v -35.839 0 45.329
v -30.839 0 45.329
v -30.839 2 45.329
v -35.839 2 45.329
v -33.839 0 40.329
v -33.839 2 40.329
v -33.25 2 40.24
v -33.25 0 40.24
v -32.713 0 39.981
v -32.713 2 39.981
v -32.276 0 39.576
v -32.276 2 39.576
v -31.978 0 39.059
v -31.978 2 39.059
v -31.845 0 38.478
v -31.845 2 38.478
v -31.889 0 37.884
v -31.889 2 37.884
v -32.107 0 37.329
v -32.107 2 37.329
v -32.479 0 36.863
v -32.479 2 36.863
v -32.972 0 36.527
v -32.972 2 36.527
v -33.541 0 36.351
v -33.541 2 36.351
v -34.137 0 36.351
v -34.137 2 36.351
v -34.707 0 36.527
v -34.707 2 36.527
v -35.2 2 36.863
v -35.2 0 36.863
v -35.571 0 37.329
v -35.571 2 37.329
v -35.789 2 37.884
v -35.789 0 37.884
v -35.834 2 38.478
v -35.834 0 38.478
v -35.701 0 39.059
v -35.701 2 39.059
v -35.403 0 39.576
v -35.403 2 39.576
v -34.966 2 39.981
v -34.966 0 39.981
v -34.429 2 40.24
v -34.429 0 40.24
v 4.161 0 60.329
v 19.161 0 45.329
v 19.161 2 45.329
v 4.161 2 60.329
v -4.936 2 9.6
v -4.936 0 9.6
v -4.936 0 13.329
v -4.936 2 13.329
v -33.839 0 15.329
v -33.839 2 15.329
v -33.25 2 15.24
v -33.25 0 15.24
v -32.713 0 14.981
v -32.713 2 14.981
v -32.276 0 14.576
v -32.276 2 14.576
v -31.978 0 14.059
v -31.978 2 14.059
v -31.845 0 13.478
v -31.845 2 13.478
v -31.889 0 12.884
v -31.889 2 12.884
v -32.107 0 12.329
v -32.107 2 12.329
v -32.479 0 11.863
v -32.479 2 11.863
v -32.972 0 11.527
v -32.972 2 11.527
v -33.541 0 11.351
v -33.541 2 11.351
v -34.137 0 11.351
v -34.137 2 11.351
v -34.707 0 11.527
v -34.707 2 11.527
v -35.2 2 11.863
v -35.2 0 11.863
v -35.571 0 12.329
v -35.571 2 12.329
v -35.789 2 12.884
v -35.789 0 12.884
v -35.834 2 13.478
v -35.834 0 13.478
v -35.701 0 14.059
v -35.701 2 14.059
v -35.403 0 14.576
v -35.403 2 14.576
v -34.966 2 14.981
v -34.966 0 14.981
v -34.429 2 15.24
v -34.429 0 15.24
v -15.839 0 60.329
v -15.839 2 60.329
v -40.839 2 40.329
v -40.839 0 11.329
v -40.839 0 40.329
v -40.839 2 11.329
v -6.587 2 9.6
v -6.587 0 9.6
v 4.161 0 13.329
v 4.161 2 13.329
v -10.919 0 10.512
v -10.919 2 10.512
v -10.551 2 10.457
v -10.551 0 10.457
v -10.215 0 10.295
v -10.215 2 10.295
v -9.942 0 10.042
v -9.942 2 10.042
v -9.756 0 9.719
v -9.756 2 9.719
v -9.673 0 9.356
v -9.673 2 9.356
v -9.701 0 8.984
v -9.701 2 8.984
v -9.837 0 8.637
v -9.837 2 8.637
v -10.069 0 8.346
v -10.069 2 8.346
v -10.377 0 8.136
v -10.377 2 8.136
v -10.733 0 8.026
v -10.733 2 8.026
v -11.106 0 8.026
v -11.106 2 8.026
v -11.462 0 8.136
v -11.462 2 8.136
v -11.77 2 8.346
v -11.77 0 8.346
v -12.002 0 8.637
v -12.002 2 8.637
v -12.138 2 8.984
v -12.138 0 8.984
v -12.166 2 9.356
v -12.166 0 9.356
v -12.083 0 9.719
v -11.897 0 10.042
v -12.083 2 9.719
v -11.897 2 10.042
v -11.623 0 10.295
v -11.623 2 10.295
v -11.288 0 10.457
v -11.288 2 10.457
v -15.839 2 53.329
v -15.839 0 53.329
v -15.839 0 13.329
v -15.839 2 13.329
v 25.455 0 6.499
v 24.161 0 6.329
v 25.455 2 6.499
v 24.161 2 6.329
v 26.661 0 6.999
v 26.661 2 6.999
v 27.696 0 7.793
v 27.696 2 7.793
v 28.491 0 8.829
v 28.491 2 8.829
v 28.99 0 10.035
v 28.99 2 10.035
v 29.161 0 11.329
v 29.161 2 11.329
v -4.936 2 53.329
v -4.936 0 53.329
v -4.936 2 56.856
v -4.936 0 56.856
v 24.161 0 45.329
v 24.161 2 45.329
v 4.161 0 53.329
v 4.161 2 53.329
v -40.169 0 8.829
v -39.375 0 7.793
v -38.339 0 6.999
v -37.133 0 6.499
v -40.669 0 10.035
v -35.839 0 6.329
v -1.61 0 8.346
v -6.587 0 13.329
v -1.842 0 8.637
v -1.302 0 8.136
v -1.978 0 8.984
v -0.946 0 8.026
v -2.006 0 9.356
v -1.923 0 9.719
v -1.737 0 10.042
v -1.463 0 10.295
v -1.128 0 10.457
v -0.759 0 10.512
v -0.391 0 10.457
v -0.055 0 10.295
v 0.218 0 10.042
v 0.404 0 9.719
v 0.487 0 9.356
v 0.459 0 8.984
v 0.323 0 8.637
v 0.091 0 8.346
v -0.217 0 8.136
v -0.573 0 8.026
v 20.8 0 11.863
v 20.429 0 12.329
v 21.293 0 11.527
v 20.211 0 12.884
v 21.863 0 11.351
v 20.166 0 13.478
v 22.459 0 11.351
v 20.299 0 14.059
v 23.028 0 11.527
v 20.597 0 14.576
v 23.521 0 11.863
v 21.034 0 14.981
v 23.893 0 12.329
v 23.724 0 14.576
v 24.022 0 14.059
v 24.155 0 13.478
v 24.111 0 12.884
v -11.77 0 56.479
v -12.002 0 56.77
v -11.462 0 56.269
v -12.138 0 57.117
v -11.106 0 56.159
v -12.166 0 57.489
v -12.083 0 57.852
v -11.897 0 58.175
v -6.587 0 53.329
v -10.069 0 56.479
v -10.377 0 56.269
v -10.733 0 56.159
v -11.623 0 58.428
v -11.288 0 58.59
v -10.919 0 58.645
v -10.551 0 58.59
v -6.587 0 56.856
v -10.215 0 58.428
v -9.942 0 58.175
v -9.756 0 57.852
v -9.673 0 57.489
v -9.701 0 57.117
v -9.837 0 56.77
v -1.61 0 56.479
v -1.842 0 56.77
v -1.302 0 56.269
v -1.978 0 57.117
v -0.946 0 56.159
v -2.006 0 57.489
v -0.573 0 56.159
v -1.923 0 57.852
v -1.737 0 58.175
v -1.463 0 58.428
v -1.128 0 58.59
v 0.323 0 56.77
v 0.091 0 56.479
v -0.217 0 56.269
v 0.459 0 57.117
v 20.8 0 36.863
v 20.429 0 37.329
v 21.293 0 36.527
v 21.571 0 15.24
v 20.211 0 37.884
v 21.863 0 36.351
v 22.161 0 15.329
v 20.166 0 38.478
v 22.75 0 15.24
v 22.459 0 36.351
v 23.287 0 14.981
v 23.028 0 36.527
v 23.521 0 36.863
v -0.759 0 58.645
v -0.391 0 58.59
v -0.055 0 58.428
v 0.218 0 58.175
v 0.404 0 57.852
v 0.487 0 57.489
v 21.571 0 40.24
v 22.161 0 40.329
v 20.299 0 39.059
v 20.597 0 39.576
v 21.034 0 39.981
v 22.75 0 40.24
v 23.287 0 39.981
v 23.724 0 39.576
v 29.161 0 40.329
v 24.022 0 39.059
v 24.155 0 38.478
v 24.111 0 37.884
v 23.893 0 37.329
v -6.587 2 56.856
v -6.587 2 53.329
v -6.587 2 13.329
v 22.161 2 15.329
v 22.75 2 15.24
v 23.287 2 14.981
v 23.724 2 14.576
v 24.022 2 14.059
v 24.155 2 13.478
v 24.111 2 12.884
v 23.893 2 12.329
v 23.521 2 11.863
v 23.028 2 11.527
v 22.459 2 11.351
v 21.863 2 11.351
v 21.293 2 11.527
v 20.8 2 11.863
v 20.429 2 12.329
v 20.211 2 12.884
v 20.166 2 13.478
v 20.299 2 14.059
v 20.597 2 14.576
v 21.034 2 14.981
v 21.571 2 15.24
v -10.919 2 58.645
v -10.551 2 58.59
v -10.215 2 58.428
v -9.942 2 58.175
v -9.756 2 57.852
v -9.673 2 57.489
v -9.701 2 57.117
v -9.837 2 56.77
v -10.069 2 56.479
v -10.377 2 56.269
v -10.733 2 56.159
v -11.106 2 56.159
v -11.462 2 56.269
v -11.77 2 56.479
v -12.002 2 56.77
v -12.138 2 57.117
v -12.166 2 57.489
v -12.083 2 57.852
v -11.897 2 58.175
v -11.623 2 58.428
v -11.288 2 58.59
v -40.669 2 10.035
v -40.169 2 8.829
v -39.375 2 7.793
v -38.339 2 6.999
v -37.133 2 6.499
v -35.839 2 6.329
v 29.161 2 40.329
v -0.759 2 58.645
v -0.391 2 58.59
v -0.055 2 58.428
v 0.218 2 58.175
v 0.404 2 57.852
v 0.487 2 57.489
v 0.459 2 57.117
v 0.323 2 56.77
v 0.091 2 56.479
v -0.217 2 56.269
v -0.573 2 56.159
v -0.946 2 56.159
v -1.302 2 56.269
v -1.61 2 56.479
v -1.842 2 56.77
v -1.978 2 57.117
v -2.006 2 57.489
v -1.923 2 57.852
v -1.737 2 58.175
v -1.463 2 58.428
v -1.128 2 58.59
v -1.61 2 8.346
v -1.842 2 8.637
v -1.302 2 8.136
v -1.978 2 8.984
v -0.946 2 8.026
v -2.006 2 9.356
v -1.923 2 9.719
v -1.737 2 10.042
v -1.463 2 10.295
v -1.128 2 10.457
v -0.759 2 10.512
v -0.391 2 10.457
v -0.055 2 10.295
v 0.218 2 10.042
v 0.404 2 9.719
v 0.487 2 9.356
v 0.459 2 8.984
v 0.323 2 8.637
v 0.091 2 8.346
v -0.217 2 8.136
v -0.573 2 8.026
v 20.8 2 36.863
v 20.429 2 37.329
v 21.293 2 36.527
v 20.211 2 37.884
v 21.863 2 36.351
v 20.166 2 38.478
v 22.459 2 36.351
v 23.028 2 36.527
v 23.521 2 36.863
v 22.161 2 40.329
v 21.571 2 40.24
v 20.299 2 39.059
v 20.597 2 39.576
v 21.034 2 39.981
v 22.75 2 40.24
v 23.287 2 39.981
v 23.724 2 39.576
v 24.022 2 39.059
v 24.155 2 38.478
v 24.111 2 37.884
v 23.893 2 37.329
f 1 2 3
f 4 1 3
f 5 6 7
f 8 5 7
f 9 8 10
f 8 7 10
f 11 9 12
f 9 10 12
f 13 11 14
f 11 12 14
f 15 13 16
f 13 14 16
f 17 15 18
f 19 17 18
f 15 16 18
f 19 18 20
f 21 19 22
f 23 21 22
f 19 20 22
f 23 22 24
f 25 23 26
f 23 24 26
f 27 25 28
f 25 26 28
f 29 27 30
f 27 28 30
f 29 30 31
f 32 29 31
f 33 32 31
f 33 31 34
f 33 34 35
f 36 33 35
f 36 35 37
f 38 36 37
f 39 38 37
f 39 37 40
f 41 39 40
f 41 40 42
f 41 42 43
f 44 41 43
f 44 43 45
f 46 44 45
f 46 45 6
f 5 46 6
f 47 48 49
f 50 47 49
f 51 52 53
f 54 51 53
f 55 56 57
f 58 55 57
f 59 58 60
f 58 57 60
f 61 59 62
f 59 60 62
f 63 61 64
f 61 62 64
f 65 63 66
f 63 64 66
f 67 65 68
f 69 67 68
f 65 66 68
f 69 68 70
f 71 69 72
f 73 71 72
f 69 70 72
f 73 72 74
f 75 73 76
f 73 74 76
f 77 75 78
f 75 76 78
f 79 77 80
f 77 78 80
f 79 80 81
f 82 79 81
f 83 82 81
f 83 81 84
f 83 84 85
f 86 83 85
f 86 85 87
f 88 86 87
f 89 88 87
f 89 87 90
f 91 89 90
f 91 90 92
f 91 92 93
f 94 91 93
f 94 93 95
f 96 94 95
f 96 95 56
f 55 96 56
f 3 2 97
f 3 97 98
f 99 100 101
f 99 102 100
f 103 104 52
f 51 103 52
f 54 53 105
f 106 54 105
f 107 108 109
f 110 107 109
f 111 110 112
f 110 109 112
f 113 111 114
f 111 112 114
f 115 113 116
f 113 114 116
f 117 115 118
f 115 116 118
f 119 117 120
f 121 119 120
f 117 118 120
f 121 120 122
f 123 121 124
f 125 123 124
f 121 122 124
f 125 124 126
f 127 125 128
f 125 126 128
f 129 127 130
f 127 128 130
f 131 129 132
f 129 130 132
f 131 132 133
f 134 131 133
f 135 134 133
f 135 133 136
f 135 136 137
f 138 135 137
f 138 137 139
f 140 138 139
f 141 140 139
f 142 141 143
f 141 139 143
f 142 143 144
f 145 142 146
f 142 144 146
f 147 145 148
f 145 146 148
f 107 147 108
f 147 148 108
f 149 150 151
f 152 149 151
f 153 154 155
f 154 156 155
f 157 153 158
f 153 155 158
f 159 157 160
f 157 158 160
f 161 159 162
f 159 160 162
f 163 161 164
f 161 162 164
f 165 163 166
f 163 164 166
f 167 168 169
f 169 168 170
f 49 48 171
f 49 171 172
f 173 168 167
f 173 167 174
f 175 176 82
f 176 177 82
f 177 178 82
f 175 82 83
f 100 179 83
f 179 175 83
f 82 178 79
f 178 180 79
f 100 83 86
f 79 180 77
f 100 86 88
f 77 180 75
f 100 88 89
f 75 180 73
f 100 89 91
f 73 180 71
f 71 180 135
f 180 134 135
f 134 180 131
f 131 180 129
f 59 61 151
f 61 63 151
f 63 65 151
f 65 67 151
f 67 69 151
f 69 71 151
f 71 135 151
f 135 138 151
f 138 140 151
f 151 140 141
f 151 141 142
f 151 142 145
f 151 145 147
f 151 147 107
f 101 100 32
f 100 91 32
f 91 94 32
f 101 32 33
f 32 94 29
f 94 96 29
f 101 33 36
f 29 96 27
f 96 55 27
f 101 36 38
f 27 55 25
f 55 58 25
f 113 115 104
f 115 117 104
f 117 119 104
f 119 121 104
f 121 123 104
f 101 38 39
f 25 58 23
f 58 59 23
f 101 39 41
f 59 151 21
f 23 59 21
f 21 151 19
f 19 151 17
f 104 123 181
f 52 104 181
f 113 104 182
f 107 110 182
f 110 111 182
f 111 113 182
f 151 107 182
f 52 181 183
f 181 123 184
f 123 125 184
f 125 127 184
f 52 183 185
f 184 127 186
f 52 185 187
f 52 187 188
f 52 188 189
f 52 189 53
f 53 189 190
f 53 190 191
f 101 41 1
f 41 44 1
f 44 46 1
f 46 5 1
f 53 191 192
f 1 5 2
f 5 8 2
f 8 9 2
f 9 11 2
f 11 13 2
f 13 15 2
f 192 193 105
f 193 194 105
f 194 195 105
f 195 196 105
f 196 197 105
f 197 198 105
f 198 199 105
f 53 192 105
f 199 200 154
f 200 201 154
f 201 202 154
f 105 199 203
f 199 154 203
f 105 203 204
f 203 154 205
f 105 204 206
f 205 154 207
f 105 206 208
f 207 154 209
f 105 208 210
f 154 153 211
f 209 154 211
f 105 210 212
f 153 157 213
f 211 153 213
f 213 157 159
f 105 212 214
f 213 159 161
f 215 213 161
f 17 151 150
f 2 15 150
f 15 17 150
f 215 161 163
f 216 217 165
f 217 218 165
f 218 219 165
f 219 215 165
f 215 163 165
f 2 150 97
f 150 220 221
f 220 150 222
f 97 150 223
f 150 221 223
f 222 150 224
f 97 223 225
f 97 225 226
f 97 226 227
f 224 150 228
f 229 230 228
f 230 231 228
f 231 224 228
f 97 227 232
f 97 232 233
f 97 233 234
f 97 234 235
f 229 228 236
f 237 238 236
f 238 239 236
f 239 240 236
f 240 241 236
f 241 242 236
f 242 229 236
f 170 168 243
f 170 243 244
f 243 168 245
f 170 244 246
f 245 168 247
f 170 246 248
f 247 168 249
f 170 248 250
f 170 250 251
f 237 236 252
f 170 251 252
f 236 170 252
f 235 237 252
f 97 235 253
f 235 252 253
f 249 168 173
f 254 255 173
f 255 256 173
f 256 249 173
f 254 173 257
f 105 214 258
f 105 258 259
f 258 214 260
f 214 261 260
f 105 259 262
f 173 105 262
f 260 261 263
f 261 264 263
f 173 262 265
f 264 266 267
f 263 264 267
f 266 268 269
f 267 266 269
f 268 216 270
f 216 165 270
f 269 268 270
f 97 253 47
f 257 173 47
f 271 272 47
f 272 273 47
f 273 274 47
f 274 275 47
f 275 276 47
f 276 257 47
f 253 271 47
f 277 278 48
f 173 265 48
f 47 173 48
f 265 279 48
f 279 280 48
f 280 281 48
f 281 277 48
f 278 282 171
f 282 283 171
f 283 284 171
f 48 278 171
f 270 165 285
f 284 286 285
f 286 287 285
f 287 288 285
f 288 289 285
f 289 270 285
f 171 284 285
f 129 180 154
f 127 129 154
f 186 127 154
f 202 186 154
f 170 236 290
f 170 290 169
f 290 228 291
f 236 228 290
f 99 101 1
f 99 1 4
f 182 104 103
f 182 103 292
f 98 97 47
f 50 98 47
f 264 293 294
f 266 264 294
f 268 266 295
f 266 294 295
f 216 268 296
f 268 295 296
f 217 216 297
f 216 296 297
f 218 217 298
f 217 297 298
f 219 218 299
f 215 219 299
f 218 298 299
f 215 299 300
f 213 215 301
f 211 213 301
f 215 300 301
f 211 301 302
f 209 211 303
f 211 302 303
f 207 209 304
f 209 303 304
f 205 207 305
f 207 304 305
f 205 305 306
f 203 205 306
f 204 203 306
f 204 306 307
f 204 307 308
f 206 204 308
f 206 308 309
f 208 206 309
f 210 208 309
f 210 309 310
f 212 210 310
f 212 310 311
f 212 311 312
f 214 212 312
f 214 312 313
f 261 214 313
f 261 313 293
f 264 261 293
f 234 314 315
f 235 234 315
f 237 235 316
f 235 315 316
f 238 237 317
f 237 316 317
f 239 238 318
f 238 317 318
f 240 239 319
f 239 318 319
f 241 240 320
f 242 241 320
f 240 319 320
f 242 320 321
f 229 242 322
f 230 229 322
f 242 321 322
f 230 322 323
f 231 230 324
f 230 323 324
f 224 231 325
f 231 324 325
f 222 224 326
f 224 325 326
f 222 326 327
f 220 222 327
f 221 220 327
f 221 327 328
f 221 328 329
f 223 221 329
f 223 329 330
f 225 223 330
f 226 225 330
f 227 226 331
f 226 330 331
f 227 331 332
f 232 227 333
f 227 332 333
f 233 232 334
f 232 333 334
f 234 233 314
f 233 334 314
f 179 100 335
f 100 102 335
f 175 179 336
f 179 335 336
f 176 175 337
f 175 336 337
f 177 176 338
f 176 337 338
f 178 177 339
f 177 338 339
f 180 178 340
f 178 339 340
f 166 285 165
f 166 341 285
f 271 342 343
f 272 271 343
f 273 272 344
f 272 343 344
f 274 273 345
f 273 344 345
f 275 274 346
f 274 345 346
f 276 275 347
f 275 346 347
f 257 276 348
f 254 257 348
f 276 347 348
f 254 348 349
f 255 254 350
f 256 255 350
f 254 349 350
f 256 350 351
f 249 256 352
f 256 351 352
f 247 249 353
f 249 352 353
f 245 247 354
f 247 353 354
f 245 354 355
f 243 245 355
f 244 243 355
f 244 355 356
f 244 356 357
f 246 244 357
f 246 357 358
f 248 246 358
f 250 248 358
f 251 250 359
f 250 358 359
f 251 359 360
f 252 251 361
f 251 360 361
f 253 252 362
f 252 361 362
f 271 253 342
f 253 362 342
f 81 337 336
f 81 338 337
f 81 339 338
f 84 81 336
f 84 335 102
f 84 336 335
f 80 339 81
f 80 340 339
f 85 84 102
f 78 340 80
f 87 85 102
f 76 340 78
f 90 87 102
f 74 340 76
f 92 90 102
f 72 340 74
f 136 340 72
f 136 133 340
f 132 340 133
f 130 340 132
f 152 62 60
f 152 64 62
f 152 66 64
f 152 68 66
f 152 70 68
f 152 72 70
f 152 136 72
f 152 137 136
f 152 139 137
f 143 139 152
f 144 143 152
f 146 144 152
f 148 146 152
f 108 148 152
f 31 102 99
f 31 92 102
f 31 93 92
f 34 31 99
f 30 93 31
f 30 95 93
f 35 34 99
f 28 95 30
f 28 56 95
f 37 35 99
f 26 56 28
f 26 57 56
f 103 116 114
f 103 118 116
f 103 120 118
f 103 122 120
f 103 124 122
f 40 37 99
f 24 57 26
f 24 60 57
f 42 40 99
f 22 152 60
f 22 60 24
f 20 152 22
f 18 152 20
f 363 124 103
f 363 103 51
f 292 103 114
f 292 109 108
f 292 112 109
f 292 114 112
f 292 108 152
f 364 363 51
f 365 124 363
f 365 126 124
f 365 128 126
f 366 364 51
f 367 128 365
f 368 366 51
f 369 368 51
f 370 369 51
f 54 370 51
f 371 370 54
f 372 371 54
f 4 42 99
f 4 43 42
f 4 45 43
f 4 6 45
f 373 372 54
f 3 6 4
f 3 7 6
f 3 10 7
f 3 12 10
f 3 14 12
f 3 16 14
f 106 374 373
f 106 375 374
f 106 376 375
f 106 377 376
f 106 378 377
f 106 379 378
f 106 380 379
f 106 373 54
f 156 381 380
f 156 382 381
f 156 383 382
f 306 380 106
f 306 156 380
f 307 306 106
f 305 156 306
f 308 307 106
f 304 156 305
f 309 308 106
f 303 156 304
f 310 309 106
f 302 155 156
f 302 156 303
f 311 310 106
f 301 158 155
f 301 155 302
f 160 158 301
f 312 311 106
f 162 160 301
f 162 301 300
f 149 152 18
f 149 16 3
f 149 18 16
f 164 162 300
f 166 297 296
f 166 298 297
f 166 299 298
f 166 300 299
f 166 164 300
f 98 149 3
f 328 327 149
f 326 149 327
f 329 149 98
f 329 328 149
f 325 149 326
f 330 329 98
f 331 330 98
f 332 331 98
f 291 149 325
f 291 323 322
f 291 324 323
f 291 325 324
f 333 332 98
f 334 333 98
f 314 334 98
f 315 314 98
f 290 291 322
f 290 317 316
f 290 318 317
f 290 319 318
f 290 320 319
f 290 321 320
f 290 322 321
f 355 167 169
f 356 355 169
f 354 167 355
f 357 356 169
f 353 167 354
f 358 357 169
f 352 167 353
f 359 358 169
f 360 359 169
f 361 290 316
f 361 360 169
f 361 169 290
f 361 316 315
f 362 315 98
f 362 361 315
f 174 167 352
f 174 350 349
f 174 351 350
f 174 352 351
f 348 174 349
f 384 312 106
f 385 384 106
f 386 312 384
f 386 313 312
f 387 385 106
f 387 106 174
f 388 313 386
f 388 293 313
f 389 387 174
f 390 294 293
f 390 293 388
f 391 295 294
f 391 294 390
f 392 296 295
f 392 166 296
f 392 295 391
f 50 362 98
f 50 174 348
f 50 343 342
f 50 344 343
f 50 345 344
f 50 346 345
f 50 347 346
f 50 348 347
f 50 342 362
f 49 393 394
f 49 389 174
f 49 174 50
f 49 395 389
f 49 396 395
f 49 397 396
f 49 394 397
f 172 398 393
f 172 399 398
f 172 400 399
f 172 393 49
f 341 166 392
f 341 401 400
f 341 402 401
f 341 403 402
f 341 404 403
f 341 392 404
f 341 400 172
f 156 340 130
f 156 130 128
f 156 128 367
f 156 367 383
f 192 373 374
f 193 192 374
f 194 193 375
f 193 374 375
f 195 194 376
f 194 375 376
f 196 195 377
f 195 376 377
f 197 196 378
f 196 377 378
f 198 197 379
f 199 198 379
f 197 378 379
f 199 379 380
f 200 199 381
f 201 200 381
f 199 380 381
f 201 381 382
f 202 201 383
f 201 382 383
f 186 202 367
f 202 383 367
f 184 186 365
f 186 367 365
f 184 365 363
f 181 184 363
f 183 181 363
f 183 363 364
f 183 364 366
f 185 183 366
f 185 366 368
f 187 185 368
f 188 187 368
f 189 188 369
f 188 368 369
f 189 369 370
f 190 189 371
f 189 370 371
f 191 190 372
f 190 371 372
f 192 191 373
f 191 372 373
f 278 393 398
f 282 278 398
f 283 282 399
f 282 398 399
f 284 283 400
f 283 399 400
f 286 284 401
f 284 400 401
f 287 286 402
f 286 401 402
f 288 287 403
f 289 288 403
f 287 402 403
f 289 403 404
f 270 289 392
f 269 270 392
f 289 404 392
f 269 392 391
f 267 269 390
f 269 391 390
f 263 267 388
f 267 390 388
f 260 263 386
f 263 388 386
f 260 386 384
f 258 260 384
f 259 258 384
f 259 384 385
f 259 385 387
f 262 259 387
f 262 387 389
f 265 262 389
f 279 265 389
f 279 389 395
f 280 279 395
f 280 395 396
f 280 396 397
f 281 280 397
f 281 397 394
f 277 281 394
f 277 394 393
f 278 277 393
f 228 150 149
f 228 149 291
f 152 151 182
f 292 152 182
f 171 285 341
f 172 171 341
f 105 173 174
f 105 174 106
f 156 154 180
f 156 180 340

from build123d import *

# Parameters (mm, degrees)
SKETCH_1_W          = 50
SKETCH_1_H          = 54
SKETCH_1_W_2        = 20
SKETCH_1_H_2        = 40
EXTRUDE_1_DEPTH     = 2
SKETCH_2_R          = 1.25
CUT_EXTRUDE_1_DEPTH = 2
CHAMFER_1_SIZE      = 15
SKETCH_3_W          = 39
SKETCH_3_H          = 2
EXTRUDE_2_DEPTH     = 10
SKETCH_4_W          = 39
SKETCH_4_H          = 2
EXTRUDE_3_DEPTH     = 10
CHAMFER_2_SIZE      = 5
SKETCH_5_R          = 2
CUT_EXTRUDE_2_DEPTH = 10
SKETCH_6_W          = 1.650327519
SKETCH_6_H          = 3.527213322
SKETCH_6_H_2        = 3.728223566
CUT_EXTRUDE_3_DEPTH = 10
FILLET_2_R          = 5


with BuildPart() as part:
    # Эскиз1 → Бобышка-Вытянуть1 (new body)
    with BuildSketch(Plane(origin=(0, 0, 0), x_dir=(1, 0, 0), z_dir=(0, 1, 0))):
        with Locations((-5.839311735, -33.32864132)):
            Rectangle(SKETCH_1_W, SKETCH_1_H)
        with Locations((-5.839311735, -33.32864132)):
            Rectangle(SKETCH_1_W_2, SKETCH_1_H_2, mode=Mode.SUBTRACT)
    extrude(amount=EXTRUDE_1_DEPTH)

    # Эскиз2 → Вырез-Вытянуть1 (cut)
    with BuildSketch(Plane(origin=(0, 2, 0), x_dir=(1, 0, 0), z_dir=(0, 1, 0))):
        with Locations(Location((-10.919311735, -57.39514132, 0), (0, 0, 270))):
            Circle(SKETCH_2_R)
        with Locations(Location((-0.759311735, -57.39514132, 0), (0, 0, 270))):
            Circle(SKETCH_2_R)
        with Locations(Location((-10.919311735, -9.26214132, 0), (0, 0, 270))):
            Circle(SKETCH_2_R)
        with Locations(Location((-0.759311735, -9.26214132, 0), (0, 0, 270))):
            Circle(SKETCH_2_R)
    extrude(amount=-CUT_EXTRUDE_1_DEPTH, mode=Mode.SUBTRACT)

    # Фаска1
    chamfer_1_edges = [part.edges().sort_by_distance(p)[0] for p in [
        (19.160688265, 1, 60.32864132),
        (-30.839311735, 1, 60.32864132),
    ]]
    chamfer(chamfer_1_edges, length=CHAMFER_1_SIZE)

    # Эскиз3 → Бобышка-Вытянуть2 (add)
    with BuildSketch(Plane(origin=(19.160688265, 0, 0), x_dir=(0, 0, -1), z_dir=(1, 0, 0))):
        with Locations((-25.82864132, 1)):
            Rectangle(SKETCH_3_W, SKETCH_3_H)
    extrude(amount=EXTRUDE_2_DEPTH)

    # Эскиз4 → Бобышка-Вытянуть3 (add)
    with BuildSketch(Plane.ZY.offset(30.839311735)):
        with Locations((25.82864132, 1)):
            Rectangle(SKETCH_4_W, SKETCH_4_H)
    extrude(amount=EXTRUDE_3_DEPTH)

    # Фаска2
    chamfer_2_edges = [part.edges().sort_by_distance(p)[0] for p in [
        (29.160688265, 1, 45.32864132),
        (-40.839311735, 1, 45.32864132),
    ]]
    chamfer(chamfer_2_edges, length=CHAMFER_2_SIZE)

    # Эскиз5 → Вырез-Вытянуть2 (cut)
    with BuildSketch(Plane(origin=(0, 2, 0), x_dir=(1, 0, 0), z_dir=(0, 1, 0))):
        with Locations(Location((22.160688265, -38.32864132, 0), (0, 0, 270))):
            Circle(SKETCH_5_R)
        with Locations(Location((-33.839311735, -38.32864132, 0), (0, 0, 270))):
            Circle(SKETCH_5_R)
        with Locations(Location((-33.839311735, -13.32864132, 0), (0, 0, 270))):
            Circle(SKETCH_5_R)
        with Locations(Location((22.160688265, -13.32864132, 0), (0, 0, 270))):
            Circle(SKETCH_5_R)
    extrude(amount=-CUT_EXTRUDE_2_DEPTH, mode=Mode.SUBTRACT)

    # Эскиз6 → Вырез-Вытянуть3 (cut)
    with BuildSketch(Plane.XZ):
        with Locations((-5.761377028, 55.092247981)):
            Rectangle(SKETCH_6_W, SKETCH_6_H)
        with Locations((-5.761377028, 11.464529537)):
            Rectangle(SKETCH_6_W, SKETCH_6_H_2)
    extrude(amount=-CUT_EXTRUDE_3_DEPTH, mode=Mode.SUBTRACT)

    # Скругление2
    fillet_2_edges = [part.edges().sort_by_distance(p)[0] for p in [
        (29.160688265, 1, 6.32864132),
        (-40.839311735, 1, 6.32864132),
    ]]
    fillet(fillet_2_edges, radius=FILLET_2_R)


solid = part.part
